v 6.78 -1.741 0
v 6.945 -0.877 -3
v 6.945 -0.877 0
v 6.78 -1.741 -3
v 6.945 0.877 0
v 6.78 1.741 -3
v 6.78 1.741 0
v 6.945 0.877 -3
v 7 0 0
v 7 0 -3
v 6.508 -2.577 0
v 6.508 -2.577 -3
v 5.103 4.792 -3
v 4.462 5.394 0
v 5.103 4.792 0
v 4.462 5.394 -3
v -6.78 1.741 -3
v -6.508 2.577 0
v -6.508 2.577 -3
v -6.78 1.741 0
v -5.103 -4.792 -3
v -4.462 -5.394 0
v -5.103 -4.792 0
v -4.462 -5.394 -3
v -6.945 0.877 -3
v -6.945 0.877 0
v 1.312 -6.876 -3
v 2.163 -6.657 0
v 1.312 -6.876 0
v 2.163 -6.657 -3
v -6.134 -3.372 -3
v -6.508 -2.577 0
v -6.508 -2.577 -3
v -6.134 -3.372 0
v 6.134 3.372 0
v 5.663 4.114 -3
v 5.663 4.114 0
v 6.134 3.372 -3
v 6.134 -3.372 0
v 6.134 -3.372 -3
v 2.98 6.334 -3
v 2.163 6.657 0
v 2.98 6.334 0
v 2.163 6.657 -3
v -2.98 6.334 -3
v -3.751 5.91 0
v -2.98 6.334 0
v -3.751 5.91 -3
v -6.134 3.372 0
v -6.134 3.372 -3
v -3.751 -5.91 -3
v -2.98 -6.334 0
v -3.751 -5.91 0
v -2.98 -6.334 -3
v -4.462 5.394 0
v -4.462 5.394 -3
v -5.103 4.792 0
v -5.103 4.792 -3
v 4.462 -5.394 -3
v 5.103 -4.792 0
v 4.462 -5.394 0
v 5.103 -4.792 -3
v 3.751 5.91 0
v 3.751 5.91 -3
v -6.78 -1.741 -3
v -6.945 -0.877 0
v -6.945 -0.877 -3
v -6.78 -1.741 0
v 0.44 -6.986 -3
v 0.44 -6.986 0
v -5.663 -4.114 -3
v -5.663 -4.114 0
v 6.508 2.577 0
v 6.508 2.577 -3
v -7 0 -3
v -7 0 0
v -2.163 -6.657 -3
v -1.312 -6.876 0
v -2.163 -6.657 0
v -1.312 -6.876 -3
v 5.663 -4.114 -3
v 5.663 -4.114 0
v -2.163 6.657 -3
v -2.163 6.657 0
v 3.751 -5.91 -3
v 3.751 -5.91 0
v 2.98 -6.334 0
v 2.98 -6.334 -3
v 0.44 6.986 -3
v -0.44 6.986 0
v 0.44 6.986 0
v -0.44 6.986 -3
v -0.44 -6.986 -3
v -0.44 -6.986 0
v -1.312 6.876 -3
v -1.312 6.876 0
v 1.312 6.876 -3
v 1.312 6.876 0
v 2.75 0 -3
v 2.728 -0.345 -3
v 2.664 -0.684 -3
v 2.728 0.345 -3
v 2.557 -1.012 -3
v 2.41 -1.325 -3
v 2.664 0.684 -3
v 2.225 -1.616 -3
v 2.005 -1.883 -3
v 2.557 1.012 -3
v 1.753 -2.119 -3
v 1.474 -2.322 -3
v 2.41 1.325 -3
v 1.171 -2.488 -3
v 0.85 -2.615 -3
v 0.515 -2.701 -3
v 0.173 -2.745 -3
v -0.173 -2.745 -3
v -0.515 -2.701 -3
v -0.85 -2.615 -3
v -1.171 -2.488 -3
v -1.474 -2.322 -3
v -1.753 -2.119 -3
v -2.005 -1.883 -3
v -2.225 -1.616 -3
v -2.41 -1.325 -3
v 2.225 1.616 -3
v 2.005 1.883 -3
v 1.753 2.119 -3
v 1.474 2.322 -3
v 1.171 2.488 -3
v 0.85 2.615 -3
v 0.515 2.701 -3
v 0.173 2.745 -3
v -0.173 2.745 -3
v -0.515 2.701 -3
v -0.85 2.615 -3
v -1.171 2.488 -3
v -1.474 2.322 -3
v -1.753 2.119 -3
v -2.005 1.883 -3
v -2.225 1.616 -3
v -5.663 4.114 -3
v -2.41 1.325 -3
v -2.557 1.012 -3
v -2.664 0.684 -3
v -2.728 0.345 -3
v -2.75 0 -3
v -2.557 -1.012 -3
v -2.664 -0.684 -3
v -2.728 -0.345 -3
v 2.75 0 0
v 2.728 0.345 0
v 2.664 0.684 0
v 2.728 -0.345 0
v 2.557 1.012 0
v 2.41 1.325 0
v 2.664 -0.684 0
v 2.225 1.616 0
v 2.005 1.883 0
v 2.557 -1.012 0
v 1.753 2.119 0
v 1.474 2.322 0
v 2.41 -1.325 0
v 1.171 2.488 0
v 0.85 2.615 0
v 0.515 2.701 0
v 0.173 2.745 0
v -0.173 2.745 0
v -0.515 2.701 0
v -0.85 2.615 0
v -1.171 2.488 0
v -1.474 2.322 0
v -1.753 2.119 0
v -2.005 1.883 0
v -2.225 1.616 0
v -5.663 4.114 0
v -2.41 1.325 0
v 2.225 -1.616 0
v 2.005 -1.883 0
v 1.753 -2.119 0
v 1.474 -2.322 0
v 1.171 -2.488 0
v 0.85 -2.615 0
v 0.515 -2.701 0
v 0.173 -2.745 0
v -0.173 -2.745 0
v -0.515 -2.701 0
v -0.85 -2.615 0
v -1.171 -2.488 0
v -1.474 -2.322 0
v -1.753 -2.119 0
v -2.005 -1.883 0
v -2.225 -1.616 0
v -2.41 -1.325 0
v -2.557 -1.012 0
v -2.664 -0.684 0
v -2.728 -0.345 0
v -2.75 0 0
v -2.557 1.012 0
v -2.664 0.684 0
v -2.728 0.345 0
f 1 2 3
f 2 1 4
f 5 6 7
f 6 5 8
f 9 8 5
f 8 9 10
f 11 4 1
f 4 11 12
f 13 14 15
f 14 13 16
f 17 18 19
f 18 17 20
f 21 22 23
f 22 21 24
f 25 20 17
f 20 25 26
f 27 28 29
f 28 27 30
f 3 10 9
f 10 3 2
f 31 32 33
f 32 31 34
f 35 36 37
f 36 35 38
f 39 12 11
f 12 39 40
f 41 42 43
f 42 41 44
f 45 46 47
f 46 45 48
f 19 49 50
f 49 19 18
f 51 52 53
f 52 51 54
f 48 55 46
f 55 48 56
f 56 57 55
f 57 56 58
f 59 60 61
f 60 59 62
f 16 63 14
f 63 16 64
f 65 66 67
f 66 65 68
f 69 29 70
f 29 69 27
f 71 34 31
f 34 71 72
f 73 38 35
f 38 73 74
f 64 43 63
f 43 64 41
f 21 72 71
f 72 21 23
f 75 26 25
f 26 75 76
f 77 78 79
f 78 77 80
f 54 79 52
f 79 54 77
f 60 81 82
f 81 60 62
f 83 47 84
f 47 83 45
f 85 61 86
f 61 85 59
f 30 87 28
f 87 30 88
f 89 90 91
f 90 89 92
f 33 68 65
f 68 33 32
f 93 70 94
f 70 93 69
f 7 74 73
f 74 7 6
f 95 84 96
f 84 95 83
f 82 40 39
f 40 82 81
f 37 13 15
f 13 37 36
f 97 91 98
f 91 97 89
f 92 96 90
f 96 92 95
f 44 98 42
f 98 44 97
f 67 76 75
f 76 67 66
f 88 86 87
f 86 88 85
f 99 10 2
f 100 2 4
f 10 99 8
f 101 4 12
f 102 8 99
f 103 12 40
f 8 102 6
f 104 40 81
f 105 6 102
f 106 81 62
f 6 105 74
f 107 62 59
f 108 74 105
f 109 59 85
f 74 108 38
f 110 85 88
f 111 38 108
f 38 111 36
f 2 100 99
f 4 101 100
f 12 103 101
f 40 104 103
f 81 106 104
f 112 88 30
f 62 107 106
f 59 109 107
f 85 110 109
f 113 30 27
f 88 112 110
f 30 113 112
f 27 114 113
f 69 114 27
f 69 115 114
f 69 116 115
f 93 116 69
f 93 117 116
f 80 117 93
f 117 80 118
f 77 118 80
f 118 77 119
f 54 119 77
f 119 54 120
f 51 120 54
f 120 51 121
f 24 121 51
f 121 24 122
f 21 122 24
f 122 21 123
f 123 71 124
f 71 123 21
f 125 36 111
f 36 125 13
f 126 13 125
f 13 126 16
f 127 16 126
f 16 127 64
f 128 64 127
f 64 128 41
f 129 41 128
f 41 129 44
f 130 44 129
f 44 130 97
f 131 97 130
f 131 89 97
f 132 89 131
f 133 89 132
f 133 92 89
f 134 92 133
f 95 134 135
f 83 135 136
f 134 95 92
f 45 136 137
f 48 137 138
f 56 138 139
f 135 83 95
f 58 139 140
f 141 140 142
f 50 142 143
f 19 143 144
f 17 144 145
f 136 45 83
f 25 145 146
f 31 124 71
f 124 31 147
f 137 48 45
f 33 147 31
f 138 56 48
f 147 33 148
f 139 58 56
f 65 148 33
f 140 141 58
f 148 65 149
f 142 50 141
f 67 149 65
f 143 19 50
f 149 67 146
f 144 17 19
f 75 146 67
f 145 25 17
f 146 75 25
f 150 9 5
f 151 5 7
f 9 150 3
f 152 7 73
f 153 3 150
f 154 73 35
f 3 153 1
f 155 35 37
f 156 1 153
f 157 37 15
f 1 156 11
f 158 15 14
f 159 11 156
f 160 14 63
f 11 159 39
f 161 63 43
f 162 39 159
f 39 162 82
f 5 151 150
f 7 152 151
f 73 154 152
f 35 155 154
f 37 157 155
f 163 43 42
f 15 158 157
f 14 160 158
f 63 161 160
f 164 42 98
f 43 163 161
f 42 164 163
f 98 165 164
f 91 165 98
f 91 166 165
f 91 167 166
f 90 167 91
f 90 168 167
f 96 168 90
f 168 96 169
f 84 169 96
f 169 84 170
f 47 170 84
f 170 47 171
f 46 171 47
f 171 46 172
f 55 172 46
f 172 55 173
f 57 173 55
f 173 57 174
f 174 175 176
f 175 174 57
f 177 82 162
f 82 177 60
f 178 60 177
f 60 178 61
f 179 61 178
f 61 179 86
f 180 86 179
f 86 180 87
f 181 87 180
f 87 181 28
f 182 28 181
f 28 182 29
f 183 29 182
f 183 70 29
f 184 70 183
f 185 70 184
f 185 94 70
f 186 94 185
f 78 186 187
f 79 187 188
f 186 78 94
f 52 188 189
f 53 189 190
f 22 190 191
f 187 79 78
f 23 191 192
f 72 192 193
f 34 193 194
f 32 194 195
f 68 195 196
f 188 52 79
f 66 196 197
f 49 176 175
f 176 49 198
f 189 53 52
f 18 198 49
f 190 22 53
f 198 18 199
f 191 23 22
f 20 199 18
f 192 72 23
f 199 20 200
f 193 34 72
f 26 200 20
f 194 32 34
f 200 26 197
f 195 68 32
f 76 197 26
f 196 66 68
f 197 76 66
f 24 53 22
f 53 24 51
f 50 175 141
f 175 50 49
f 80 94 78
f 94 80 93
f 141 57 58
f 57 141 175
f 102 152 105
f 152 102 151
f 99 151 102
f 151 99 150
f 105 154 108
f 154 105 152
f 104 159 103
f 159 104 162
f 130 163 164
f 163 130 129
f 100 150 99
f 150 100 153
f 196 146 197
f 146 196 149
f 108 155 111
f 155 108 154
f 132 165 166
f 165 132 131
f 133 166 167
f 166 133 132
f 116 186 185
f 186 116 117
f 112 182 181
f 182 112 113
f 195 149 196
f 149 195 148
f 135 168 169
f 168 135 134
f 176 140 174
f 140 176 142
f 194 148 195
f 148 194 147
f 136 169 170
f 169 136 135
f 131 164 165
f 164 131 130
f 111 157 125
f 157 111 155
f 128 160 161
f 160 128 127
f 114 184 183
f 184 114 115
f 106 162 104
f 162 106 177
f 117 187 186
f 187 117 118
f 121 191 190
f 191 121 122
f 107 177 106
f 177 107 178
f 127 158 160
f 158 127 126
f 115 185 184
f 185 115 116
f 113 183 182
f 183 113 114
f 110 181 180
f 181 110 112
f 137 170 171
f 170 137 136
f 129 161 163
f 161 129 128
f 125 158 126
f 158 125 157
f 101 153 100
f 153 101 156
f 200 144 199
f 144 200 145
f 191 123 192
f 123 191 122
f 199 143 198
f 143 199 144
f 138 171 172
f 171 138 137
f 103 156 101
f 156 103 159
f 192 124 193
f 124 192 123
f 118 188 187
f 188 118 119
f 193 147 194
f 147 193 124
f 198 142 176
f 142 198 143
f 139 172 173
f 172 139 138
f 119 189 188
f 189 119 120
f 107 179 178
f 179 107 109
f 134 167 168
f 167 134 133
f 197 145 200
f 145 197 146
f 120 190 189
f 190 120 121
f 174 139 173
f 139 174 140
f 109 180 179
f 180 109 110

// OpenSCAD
$fn = 50;


difference() {
	union() {
		translate(v = [0, 0, -3.0000000000]) {
			cylinder(h = 3, r = 7.0000000000);
		}
		cylinder(h = 0, r = 16.0000000000);
	}
	union() {
		#translate(v = [0, 0, -3]) {
			cylinder(h = 3, r = 2.7500000000);
		}
	}
}
